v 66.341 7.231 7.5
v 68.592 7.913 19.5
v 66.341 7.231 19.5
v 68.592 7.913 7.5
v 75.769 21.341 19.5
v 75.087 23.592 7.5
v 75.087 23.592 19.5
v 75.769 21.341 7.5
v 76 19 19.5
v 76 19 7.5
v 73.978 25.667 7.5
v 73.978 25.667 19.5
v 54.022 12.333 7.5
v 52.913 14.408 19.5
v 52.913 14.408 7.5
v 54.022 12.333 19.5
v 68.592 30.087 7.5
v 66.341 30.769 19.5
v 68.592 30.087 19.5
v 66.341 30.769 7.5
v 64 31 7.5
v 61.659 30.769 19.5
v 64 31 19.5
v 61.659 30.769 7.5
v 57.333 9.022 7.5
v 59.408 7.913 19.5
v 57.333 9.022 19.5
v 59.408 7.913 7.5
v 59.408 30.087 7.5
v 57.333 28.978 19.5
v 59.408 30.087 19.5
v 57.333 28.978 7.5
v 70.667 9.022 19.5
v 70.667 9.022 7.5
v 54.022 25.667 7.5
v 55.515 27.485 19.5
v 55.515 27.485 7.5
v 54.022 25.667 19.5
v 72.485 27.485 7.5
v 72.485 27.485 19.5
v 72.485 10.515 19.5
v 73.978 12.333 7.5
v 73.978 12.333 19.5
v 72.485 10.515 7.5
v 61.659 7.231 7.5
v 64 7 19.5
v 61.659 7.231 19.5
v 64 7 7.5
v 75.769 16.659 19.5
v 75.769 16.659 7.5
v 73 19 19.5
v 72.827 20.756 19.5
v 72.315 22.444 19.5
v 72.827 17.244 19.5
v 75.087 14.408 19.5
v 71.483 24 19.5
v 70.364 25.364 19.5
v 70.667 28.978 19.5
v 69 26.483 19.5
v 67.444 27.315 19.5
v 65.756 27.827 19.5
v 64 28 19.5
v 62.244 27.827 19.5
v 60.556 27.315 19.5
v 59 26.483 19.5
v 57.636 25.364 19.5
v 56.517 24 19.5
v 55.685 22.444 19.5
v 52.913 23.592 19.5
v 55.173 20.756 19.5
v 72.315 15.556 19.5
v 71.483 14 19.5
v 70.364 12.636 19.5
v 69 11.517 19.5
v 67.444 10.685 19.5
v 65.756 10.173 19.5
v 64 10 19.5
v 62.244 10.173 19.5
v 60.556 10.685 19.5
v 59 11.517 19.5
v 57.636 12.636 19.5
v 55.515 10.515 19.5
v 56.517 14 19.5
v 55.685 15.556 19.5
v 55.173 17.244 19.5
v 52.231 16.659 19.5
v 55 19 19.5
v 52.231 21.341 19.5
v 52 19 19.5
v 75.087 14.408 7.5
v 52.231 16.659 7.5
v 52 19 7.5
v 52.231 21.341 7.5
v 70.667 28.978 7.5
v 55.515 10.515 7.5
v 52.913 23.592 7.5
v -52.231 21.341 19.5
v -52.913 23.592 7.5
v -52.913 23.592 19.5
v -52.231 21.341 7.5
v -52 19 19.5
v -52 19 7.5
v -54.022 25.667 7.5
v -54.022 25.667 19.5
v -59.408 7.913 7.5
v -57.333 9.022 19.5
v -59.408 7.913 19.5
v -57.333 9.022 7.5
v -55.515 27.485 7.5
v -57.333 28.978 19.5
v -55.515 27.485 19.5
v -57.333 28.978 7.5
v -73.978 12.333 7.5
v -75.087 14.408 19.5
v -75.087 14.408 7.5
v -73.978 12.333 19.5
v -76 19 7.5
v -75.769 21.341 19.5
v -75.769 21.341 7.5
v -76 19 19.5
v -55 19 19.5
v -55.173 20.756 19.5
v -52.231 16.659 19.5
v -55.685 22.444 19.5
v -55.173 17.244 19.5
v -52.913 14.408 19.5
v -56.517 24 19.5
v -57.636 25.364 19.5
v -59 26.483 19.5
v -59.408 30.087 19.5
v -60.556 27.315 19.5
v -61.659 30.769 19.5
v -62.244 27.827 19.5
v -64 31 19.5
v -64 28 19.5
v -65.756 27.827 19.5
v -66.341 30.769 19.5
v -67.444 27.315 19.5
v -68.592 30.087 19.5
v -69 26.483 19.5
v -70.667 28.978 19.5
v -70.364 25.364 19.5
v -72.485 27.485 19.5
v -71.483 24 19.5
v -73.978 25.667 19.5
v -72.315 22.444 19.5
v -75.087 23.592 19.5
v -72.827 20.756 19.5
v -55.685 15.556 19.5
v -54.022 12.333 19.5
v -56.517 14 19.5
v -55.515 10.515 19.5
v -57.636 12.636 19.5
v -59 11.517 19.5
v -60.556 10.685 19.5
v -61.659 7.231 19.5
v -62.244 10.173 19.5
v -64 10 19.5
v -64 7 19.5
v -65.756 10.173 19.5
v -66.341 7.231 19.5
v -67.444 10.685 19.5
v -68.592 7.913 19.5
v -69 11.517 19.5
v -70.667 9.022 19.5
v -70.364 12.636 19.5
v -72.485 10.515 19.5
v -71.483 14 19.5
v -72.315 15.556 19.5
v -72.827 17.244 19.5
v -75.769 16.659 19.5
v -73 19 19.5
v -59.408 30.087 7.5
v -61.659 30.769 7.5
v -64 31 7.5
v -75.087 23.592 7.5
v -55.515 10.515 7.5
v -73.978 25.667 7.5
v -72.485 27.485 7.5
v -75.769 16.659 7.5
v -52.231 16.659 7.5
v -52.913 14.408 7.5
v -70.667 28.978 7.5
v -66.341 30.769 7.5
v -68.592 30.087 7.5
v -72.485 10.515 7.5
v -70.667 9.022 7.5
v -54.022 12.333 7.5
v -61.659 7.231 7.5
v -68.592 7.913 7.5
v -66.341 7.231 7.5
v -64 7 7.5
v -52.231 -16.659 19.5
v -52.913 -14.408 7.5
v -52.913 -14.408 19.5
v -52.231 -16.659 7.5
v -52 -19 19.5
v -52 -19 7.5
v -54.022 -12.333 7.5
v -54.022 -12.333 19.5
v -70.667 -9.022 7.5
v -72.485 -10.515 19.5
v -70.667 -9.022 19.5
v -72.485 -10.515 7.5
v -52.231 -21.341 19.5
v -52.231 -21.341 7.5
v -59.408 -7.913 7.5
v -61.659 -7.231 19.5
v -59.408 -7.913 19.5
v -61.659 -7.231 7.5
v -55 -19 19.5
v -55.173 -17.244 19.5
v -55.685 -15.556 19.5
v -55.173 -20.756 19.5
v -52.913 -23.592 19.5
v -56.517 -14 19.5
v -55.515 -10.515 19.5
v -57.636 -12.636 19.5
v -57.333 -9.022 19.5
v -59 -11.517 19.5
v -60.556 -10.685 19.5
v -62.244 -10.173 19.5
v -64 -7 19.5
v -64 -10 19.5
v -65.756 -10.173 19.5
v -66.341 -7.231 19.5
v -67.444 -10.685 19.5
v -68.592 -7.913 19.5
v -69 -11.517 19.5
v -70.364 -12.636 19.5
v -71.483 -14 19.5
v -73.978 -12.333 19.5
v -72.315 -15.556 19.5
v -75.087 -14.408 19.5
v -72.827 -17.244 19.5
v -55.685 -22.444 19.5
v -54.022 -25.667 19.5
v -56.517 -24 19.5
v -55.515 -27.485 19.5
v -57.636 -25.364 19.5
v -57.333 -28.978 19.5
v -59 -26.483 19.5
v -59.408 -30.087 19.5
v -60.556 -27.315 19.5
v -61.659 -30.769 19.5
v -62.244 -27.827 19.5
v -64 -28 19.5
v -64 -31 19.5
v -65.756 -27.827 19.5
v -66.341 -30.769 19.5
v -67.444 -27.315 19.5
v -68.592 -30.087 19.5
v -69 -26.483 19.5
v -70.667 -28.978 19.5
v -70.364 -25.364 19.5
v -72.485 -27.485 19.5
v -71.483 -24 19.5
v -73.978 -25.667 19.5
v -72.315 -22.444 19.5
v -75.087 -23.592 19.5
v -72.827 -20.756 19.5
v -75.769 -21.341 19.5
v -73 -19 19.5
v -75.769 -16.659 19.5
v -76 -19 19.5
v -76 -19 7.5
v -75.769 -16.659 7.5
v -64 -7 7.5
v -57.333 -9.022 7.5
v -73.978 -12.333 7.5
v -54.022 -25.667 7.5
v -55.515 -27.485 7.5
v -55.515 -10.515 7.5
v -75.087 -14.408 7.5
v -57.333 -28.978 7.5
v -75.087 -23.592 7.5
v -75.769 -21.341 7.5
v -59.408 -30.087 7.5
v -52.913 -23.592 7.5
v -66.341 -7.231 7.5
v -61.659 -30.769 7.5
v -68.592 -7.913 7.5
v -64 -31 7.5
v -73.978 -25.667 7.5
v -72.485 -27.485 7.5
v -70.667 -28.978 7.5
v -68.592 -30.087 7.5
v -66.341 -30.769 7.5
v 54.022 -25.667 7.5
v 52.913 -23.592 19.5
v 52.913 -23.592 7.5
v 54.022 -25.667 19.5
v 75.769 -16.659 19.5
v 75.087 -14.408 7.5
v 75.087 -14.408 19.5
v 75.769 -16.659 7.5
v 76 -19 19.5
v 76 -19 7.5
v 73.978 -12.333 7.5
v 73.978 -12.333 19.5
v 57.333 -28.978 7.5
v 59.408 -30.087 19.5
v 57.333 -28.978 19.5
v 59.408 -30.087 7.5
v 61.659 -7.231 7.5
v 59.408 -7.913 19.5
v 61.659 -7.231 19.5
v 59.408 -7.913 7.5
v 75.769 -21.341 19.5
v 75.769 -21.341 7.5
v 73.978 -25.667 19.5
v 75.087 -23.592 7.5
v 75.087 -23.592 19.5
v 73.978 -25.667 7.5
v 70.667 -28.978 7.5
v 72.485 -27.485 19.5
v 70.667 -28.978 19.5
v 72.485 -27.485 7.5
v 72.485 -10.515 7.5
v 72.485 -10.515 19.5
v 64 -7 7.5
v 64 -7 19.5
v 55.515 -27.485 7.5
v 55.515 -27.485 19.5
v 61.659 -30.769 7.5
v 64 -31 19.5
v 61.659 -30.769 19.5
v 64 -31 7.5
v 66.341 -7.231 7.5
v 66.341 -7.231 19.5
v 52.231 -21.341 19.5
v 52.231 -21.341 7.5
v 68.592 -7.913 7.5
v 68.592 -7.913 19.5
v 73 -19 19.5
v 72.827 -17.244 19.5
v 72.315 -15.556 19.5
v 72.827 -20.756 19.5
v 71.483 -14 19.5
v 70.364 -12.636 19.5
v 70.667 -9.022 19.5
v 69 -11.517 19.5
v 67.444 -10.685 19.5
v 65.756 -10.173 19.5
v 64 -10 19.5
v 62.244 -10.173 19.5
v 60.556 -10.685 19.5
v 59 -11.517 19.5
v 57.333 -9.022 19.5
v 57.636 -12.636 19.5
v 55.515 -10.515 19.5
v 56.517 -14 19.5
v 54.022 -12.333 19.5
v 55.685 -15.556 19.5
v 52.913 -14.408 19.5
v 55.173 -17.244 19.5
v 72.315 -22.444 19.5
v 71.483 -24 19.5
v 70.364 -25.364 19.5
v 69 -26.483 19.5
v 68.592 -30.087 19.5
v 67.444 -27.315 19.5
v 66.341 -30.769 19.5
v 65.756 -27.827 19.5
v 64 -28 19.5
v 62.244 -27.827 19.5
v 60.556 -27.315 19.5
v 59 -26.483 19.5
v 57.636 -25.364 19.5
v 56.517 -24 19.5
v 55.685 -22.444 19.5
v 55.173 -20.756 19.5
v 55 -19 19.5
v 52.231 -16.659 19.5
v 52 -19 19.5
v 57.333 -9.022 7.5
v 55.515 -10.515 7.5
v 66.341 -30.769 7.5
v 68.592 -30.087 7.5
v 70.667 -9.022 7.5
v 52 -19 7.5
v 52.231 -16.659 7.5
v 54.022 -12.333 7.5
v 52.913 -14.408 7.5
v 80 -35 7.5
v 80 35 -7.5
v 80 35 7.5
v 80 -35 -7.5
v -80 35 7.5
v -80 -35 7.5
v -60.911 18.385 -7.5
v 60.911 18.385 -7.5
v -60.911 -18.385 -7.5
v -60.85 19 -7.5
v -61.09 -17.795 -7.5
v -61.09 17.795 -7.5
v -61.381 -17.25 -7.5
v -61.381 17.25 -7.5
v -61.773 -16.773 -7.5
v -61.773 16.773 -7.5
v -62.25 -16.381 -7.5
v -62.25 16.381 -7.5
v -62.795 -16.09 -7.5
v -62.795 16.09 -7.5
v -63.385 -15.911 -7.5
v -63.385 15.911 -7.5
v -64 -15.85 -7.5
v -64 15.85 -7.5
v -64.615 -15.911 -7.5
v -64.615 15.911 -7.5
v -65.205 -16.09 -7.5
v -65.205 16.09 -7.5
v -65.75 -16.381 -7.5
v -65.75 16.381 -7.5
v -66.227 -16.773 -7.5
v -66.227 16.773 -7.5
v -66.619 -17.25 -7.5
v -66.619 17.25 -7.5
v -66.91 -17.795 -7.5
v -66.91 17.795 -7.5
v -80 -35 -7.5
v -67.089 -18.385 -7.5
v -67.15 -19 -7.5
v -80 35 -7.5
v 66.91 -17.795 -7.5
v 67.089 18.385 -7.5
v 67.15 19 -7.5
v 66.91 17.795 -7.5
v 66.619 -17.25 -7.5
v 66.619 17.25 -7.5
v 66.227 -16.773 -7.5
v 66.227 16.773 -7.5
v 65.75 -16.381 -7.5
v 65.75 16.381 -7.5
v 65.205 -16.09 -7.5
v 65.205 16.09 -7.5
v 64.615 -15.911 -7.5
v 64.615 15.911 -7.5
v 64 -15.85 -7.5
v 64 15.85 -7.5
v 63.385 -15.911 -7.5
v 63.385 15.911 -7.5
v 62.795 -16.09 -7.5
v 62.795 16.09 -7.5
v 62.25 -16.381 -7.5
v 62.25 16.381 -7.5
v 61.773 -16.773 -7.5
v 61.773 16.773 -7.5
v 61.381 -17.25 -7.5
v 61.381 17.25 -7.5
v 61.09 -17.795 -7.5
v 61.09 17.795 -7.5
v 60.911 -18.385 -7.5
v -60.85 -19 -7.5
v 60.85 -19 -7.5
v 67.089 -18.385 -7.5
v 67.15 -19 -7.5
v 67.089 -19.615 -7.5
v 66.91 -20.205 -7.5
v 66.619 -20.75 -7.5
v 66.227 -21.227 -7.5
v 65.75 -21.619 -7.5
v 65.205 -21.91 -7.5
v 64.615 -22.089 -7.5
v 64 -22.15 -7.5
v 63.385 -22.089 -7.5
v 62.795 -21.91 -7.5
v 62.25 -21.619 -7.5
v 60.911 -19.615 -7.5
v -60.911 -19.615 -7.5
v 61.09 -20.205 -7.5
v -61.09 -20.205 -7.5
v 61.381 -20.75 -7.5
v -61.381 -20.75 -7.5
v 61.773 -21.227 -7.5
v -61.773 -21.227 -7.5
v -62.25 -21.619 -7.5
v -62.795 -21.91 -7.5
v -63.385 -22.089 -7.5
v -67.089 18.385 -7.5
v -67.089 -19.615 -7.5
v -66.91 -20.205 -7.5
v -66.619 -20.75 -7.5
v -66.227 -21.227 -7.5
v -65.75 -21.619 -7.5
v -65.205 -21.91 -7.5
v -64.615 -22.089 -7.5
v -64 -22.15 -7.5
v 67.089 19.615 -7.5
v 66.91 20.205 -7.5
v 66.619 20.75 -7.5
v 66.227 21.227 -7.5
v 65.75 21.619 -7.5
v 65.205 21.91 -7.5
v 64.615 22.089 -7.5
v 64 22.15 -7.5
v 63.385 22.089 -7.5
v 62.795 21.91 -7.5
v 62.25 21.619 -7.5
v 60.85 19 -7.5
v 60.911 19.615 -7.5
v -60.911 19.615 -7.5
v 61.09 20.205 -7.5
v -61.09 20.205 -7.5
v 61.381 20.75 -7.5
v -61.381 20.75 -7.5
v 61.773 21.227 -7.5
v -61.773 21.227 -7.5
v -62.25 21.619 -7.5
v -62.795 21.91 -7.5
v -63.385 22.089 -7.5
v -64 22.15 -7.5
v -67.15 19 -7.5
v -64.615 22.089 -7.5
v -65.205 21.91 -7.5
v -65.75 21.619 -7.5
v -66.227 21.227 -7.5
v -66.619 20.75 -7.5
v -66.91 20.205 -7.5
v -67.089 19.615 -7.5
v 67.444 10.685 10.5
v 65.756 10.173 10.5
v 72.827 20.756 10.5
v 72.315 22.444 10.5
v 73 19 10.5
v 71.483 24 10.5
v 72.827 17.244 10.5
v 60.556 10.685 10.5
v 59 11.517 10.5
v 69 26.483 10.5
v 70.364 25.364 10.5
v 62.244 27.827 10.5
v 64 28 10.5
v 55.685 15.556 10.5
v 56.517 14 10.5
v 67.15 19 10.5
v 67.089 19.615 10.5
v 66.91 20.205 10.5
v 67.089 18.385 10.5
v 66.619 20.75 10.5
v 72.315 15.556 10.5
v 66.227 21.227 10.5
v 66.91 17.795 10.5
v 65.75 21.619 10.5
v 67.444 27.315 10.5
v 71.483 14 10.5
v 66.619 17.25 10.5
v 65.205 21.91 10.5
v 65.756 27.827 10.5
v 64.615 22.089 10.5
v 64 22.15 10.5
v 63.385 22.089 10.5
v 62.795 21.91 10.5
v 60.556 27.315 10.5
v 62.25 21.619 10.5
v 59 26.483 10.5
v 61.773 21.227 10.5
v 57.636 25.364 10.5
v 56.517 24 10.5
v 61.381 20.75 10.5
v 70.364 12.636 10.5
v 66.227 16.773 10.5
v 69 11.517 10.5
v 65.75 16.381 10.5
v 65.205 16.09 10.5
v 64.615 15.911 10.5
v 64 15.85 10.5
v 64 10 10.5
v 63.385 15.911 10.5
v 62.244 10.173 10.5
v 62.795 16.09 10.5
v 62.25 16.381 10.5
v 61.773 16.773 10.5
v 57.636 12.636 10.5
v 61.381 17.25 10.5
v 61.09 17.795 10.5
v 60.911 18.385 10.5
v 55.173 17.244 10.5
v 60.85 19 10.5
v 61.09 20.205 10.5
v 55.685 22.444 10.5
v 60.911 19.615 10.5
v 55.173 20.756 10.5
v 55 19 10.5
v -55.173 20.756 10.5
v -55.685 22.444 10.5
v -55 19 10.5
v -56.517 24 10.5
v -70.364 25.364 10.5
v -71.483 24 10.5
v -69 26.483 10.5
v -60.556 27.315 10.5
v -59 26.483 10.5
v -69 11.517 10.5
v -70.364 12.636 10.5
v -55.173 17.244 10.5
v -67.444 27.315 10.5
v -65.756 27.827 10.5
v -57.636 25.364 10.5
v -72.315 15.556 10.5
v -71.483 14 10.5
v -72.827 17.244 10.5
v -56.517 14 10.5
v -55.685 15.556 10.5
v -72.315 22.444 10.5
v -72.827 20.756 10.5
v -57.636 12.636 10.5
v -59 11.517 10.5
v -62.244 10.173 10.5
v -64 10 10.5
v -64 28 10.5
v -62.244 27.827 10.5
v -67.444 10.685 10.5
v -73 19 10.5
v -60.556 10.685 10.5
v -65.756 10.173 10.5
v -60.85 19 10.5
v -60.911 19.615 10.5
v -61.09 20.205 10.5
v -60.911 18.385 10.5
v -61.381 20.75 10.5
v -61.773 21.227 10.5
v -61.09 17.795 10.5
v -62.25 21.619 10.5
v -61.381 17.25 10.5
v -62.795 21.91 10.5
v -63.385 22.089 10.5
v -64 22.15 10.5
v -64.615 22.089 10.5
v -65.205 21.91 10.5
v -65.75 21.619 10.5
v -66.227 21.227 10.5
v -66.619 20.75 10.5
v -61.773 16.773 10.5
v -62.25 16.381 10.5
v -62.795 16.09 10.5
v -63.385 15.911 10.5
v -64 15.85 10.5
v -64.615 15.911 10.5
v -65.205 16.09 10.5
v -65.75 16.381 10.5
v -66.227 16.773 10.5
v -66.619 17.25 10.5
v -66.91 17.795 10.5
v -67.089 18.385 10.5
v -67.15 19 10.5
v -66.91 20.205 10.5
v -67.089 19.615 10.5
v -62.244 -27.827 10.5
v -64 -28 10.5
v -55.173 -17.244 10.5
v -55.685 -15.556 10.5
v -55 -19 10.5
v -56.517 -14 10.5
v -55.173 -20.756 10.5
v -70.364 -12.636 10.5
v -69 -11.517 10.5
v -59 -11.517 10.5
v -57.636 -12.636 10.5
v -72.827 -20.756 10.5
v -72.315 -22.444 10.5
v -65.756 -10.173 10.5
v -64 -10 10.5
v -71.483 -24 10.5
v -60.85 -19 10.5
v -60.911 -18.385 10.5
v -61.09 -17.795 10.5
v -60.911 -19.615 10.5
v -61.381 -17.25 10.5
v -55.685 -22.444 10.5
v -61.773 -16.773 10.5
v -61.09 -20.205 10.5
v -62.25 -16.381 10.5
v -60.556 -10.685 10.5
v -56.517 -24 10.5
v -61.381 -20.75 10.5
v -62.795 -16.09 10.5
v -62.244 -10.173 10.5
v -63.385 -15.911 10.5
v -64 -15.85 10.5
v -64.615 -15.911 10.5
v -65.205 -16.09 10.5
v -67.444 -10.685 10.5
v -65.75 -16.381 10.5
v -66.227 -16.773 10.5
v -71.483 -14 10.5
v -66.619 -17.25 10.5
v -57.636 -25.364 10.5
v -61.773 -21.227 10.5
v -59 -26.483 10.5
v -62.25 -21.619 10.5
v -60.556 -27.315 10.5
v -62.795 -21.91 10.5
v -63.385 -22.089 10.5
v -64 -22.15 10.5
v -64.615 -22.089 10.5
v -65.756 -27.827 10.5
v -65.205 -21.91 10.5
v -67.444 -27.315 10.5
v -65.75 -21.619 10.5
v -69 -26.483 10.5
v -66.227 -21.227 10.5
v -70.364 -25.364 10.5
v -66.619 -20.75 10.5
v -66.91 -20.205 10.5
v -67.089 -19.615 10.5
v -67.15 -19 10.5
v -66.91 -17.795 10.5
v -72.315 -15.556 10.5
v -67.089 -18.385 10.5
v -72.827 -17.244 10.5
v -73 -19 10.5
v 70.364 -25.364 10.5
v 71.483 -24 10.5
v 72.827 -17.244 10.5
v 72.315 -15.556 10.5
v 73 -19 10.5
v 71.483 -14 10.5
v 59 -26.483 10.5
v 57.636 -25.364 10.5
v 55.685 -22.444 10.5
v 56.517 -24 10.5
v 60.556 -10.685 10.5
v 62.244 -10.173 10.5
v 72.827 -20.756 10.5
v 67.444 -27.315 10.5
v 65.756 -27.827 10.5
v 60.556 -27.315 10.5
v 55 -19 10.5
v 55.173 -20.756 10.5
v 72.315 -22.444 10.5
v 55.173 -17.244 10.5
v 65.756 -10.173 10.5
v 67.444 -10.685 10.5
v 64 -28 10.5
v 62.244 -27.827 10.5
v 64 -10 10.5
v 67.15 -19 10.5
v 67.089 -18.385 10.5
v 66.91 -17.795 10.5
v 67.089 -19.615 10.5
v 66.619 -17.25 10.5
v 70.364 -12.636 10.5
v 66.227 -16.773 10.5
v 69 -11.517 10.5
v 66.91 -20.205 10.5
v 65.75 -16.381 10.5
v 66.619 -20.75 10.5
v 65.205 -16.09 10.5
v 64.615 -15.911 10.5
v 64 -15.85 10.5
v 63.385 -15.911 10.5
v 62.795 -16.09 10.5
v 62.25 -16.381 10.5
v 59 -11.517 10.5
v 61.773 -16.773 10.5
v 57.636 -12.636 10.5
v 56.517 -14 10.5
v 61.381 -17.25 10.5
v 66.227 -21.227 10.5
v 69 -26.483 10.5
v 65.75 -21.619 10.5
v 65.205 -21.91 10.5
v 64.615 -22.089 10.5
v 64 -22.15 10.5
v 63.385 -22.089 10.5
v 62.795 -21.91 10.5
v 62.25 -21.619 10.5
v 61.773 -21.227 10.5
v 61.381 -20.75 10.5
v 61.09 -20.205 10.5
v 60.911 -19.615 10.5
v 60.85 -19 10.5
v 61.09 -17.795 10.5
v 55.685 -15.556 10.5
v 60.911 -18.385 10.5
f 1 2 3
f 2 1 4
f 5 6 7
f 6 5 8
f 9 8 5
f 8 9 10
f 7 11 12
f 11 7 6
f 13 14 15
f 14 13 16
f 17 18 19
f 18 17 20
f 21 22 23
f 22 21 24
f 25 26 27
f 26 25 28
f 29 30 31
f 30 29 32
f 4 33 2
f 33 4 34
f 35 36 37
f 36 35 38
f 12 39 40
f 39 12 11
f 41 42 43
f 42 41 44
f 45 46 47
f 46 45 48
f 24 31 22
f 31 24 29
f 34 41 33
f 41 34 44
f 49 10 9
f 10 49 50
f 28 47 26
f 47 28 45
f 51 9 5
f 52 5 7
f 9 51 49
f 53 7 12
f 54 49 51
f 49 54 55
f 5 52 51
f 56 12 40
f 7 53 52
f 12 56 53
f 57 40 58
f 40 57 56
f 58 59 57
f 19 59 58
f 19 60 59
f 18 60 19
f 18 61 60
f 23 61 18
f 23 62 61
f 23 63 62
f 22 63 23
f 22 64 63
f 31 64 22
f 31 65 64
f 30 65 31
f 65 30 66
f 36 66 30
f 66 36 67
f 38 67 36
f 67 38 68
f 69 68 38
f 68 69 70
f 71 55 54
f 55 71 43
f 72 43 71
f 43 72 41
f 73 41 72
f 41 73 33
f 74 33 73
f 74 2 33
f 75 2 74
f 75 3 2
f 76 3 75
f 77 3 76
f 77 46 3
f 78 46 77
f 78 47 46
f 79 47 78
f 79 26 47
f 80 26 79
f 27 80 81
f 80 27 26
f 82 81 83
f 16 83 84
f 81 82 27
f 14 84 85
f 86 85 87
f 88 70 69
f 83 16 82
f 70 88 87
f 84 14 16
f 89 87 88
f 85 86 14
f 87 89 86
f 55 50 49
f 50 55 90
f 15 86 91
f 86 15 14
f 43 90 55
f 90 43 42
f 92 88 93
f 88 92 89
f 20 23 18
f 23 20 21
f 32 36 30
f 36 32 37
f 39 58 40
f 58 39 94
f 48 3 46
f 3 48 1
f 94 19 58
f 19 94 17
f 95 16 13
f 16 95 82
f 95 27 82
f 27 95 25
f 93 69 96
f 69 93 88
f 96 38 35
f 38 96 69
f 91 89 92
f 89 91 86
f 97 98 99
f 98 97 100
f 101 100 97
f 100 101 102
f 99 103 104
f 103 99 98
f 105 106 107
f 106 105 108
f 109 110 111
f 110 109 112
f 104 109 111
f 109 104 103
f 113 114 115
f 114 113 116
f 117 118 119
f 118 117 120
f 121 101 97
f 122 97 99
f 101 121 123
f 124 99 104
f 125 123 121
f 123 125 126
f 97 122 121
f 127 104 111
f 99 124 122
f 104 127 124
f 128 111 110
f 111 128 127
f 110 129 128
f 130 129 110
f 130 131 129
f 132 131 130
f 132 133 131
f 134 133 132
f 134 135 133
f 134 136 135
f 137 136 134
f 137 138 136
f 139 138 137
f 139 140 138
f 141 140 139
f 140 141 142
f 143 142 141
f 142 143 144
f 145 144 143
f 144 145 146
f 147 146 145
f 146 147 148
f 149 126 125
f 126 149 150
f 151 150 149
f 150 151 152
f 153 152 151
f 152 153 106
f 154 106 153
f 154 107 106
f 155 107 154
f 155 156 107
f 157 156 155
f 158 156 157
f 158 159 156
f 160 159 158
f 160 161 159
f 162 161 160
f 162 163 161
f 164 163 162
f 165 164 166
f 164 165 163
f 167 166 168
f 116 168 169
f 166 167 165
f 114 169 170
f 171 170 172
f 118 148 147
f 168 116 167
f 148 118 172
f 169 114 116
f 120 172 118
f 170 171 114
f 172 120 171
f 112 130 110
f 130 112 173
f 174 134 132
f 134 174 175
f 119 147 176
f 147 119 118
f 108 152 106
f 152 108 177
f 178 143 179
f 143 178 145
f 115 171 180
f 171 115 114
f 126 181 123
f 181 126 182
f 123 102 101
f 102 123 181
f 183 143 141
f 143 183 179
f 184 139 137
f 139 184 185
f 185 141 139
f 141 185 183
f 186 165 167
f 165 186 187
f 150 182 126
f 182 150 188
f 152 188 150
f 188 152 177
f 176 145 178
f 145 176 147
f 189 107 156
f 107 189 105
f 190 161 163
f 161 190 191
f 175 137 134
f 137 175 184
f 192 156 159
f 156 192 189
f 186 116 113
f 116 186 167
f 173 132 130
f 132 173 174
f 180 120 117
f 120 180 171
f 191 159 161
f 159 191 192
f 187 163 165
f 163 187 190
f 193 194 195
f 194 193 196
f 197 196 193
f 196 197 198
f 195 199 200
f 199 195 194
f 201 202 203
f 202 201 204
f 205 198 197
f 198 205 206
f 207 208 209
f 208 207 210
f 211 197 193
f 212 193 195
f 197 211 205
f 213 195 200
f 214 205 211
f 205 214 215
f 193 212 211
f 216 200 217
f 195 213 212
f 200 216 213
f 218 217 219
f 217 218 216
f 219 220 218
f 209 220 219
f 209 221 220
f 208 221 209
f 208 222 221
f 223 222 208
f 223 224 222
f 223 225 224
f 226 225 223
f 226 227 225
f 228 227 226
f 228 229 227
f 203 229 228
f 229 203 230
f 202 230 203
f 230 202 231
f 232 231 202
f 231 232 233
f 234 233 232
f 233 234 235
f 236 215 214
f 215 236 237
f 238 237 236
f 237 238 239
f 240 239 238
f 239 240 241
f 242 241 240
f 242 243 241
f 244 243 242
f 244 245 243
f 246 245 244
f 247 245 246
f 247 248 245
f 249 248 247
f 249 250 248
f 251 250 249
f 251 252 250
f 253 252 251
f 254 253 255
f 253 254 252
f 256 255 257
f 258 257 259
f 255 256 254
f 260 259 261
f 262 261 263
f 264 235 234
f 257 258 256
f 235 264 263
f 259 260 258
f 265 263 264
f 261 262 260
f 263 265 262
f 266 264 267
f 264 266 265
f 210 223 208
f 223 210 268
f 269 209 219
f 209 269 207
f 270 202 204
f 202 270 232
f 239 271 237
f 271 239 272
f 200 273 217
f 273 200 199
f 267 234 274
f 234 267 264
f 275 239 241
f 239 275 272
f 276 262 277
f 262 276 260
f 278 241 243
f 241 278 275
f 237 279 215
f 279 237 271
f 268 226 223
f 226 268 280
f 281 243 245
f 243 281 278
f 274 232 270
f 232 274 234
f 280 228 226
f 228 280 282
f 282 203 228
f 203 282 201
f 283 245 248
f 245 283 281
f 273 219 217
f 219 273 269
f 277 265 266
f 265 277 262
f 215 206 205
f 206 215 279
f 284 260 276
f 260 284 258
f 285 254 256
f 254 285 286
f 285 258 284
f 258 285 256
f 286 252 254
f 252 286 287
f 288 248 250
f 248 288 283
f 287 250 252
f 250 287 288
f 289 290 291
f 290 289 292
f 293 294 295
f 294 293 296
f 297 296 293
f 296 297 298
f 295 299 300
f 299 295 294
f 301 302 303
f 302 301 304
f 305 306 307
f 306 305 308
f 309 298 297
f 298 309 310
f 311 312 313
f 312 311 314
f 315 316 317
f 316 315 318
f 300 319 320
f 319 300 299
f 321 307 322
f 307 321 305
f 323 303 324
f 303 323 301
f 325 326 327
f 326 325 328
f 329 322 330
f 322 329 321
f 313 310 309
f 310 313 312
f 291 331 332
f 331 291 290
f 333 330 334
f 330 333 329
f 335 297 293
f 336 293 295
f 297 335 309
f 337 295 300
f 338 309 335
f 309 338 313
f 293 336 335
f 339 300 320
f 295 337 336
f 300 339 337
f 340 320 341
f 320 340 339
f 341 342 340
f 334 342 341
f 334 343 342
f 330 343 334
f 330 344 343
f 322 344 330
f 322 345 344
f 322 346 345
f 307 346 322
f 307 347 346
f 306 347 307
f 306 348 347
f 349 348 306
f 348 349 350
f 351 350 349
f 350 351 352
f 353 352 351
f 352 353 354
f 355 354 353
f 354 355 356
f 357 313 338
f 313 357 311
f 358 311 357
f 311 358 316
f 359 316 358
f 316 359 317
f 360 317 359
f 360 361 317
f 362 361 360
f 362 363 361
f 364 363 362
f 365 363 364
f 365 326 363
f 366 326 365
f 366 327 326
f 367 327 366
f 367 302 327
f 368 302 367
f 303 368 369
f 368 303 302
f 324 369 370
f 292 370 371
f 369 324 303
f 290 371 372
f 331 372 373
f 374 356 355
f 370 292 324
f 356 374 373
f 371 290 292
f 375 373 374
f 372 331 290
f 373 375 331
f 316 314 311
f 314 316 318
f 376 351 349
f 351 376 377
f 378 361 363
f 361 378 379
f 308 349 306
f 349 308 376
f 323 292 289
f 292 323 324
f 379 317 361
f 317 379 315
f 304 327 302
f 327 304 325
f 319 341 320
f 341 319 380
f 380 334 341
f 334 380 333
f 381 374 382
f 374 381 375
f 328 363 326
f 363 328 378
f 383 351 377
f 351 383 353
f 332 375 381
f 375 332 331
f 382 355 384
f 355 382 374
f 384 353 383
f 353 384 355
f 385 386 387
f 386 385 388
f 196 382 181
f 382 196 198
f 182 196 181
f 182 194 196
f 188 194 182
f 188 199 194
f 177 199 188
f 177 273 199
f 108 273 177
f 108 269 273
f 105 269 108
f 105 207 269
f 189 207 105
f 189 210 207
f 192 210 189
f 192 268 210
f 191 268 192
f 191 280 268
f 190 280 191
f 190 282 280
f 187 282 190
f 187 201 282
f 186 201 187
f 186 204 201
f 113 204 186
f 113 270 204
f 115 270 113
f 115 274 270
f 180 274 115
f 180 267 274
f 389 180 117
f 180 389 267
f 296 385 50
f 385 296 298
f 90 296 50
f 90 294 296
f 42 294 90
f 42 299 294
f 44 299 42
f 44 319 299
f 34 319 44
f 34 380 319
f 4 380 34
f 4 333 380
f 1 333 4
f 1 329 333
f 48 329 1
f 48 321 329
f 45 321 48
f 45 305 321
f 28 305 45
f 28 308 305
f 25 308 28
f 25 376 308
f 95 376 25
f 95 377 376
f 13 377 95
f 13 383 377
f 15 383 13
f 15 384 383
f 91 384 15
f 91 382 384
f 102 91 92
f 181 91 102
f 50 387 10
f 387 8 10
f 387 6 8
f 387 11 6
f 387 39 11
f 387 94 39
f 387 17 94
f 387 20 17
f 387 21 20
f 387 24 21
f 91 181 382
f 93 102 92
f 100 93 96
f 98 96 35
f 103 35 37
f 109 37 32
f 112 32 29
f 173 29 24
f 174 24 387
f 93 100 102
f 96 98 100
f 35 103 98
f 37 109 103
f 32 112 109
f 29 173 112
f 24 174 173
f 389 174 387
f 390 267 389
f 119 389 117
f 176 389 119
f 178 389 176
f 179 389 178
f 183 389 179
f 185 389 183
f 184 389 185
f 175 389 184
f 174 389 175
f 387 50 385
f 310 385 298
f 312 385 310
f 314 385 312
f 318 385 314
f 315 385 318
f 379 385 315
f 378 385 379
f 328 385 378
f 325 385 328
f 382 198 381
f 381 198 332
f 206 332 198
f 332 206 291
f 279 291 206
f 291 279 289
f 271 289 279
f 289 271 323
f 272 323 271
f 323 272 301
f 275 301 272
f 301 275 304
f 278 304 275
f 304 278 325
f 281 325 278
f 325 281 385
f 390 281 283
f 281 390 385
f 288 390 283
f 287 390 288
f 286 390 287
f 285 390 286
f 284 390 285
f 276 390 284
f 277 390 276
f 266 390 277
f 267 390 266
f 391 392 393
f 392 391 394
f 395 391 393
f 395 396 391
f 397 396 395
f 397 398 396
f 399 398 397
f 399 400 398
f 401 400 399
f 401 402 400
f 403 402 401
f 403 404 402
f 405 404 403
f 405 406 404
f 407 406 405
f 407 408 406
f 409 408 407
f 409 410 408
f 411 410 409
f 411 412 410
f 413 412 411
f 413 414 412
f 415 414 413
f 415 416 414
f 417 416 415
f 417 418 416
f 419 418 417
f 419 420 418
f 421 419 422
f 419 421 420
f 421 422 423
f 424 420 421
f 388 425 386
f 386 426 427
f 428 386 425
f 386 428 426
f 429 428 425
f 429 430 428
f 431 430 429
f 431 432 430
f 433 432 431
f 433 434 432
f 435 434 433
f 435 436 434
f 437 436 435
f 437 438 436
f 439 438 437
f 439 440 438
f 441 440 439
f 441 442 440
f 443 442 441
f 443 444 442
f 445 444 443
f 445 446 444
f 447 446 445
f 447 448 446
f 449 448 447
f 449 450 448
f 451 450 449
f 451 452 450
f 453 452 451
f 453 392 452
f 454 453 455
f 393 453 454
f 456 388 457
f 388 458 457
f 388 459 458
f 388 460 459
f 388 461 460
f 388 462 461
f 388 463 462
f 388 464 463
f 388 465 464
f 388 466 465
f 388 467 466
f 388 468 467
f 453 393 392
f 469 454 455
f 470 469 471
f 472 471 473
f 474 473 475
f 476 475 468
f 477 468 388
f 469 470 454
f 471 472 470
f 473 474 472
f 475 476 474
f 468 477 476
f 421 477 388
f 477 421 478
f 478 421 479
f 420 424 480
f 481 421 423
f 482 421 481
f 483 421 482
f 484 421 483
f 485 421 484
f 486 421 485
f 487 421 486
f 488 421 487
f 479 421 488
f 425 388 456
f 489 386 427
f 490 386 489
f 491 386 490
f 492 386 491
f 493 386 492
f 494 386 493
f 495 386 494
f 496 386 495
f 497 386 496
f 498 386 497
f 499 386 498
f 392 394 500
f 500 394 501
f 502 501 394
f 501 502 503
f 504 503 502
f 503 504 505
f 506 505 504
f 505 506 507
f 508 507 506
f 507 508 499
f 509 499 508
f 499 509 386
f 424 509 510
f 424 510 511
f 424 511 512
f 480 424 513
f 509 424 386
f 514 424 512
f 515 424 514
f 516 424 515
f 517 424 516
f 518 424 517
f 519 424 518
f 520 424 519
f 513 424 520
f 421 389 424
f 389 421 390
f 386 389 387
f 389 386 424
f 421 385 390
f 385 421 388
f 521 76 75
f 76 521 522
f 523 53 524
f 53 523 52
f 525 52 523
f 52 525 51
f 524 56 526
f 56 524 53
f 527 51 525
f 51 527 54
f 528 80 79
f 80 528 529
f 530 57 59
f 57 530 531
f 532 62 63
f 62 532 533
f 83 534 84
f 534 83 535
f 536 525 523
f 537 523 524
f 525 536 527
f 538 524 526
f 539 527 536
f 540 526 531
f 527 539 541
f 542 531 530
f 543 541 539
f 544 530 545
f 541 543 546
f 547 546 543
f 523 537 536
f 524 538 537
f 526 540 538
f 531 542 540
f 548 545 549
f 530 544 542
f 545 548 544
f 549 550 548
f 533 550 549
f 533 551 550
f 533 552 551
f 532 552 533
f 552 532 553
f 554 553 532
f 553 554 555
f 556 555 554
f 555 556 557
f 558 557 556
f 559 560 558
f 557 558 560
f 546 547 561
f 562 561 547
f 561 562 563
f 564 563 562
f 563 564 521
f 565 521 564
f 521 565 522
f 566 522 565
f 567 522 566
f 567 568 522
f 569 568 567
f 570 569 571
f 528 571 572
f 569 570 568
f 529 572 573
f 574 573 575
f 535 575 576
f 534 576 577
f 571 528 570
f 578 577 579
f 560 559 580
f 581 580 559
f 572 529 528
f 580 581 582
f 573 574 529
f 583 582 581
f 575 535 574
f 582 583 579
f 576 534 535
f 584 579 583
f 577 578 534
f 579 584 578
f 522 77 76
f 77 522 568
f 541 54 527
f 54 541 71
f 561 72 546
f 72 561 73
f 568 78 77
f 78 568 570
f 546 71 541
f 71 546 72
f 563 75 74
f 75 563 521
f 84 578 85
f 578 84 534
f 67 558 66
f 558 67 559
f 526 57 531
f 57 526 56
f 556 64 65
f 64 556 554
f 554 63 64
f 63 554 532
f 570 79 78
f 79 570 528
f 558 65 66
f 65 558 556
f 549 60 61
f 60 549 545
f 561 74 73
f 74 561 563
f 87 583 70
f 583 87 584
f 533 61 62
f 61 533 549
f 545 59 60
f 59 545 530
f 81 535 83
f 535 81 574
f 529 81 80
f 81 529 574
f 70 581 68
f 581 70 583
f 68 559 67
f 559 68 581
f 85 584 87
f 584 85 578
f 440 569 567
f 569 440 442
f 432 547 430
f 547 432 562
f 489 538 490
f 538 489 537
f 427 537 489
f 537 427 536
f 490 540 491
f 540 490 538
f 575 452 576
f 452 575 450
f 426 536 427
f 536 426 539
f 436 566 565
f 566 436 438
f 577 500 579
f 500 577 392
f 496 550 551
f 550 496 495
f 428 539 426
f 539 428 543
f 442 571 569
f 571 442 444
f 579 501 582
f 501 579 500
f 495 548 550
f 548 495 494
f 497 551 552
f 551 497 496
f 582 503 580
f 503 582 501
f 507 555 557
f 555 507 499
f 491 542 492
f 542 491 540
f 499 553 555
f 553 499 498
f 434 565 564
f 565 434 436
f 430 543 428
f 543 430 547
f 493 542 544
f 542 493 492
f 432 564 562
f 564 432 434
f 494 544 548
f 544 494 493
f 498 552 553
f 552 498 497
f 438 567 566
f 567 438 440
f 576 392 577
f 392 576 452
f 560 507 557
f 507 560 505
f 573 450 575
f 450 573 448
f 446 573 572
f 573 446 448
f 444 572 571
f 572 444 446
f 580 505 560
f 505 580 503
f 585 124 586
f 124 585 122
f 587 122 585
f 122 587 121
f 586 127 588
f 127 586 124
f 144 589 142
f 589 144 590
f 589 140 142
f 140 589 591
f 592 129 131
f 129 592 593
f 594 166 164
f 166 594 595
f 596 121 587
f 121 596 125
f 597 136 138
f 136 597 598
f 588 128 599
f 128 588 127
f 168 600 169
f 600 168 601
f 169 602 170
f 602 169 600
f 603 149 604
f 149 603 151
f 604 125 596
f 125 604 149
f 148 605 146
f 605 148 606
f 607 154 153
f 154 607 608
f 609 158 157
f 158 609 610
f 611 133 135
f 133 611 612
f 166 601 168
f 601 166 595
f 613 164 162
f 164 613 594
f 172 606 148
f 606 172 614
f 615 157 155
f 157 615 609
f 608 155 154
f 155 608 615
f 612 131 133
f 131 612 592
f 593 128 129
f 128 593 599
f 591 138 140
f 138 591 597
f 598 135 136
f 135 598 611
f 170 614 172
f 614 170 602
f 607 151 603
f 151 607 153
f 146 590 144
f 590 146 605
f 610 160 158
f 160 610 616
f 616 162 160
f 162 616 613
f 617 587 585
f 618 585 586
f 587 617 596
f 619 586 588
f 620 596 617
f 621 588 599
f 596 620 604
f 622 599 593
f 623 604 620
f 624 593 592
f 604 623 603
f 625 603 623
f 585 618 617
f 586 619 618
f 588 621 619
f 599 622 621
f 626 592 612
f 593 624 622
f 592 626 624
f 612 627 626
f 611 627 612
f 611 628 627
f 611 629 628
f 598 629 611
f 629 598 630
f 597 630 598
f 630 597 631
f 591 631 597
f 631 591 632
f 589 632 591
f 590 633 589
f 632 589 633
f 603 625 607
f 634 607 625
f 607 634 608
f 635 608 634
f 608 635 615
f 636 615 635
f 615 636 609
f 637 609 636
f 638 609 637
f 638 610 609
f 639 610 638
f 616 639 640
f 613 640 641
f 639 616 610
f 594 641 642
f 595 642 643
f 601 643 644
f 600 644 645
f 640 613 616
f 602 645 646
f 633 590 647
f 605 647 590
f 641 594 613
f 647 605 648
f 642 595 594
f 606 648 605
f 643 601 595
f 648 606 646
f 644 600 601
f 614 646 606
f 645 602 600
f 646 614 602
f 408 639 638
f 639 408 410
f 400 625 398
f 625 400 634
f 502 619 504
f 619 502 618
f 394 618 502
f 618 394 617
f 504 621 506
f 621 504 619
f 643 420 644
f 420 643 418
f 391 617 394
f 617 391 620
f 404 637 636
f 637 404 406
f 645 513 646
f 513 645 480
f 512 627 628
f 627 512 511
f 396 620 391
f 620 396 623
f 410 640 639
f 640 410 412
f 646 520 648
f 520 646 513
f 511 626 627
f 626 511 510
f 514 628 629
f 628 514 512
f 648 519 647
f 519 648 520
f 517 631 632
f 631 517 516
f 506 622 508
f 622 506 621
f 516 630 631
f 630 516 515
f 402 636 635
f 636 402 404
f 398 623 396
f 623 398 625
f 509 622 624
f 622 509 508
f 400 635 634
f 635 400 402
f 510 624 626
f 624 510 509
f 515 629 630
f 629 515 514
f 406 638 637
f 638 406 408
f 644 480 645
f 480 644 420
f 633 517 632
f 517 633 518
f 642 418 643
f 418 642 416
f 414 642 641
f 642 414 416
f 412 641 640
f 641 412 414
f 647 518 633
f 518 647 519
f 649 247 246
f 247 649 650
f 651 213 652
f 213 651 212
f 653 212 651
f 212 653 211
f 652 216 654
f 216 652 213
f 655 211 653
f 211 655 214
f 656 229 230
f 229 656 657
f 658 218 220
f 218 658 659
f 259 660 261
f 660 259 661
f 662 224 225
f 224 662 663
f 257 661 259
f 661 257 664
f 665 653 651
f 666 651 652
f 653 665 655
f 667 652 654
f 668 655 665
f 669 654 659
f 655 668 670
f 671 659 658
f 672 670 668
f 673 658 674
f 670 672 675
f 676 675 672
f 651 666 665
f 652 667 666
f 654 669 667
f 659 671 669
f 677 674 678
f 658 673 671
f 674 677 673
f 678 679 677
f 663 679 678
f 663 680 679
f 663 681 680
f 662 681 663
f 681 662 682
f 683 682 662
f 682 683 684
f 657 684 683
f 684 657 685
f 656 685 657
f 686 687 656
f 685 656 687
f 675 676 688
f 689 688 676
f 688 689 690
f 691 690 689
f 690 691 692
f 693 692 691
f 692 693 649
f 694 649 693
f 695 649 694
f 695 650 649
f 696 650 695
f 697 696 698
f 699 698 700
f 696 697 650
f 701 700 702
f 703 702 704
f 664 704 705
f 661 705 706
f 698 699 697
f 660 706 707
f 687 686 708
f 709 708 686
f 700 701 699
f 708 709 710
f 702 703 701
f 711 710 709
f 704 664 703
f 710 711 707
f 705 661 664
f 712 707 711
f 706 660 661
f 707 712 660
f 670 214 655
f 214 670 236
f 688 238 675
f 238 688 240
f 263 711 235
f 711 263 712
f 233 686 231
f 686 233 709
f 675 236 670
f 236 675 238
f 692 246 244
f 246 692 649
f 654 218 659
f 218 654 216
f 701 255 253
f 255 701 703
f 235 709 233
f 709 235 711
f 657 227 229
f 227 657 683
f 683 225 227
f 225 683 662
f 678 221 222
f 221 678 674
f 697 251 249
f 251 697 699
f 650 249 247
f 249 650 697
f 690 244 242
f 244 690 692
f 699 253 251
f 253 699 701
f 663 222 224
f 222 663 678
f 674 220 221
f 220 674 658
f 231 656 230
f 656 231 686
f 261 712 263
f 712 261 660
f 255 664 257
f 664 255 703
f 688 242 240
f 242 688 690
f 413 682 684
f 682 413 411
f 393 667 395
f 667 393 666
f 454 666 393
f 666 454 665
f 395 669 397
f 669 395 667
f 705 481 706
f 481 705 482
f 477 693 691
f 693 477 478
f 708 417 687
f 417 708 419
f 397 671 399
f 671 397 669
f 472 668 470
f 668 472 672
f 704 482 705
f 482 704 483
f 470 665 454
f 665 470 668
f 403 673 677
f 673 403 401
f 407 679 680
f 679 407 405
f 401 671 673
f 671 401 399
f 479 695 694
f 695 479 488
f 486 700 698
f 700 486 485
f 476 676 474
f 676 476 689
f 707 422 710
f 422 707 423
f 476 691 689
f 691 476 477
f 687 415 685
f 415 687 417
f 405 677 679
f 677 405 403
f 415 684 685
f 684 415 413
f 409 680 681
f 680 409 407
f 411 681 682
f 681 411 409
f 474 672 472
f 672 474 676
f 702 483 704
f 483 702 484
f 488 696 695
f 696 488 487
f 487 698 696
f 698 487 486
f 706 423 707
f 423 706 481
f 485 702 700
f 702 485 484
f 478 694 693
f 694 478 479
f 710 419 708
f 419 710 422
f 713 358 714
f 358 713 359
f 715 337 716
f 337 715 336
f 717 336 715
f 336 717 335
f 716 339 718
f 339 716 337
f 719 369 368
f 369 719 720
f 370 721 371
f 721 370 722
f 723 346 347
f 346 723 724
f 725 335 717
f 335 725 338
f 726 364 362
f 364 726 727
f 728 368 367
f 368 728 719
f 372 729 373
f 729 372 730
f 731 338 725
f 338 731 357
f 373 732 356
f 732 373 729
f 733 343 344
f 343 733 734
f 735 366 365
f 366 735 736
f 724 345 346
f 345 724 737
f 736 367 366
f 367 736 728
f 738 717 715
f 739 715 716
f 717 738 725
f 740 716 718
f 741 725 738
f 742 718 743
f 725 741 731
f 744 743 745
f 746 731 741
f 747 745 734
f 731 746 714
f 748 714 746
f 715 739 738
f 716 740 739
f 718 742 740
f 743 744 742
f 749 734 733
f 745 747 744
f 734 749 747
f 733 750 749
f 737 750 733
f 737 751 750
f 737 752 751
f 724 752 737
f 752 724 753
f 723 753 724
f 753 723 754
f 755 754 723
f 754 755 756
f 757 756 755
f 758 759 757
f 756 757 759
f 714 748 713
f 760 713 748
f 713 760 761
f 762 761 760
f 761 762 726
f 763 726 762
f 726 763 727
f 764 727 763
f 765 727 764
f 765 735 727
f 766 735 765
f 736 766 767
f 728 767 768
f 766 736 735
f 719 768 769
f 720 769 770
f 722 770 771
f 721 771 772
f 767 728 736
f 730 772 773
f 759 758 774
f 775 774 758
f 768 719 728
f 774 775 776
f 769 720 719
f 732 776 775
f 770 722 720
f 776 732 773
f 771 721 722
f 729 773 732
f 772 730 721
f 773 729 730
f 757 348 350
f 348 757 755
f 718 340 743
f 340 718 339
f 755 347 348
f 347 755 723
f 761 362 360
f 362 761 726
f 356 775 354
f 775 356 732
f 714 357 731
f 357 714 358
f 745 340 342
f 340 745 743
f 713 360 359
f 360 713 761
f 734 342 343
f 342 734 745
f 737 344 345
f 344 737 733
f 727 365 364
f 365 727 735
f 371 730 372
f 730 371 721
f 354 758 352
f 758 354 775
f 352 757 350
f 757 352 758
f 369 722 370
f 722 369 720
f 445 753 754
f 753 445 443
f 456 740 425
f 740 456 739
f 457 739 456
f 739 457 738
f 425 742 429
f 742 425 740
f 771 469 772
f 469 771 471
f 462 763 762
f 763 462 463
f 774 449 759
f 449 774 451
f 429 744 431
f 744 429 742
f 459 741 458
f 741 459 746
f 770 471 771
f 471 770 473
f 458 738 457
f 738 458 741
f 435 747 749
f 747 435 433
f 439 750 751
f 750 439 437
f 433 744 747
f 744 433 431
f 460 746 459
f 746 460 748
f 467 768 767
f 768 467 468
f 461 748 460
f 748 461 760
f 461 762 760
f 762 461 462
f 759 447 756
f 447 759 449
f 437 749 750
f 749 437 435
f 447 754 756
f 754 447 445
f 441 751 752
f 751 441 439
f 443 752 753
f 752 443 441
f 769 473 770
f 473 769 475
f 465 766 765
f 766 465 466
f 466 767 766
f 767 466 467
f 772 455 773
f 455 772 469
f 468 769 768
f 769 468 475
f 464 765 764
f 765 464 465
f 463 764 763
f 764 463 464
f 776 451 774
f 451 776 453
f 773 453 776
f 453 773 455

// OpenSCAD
$fn = 32;

// ----------------------------------------------------------------------
// Socket pad plate
// bosses with counterbored sockets for the screws
// ----------------------------------------------------------------------

// --- parameters (mm) ---
base_t = 15;            // base plate thickness
boss_h = 12;            // boss height above the base plate
boss_d = 24;            // boss diameter
socket_d = 18;          // socket diameter
socket_depth = 9;       // socket depth from the boss face
bolt_d = 6.3;           // screw clearance hole through the socket floor
plate = [160, 70, 15];  // overall size (x, y, z)
edge = 16;              // boss centre offset from the plate edge
pads = 4;               // boss count, one per corner

// --- derived feature positions (mm) ---
height = base_t + boss_h;        // = 27   overall height of the part
corner_x = plate[0] / 2 - edge;  // = 64   boss centre X
corner_y = plate[1] / 2 - edge;  // = 19   boss centre Y
feature_centers = [
  [corner_x, corner_y],
  [-corner_x, corner_y],
  [-corner_x, -corner_y],
  [corner_x, -corner_y]
];   // boss centres: sockets, holes and the pads themselves are placed from here

// base plate, bosses on feature_centers, socket + through hole in each
difference() {
  union() {
    cube(plate, center = true);
    for (centre = feature_centers)
      translate([centre[0], centre[1], plate[2] / 2 - 1])
        cylinder(d = boss_d, h = boss_h + 1);
  }
  for (centre = feature_centers) {
    translate([centre[0], centre[1], plate[2] / 2 + boss_h - socket_depth])
      cylinder(d = socket_d, h = socket_depth + 1);
    translate([centre[0], centre[1], -height])
      cylinder(d = bolt_d, h = 2 * height + 2);  // through the socket floor
  }
}
